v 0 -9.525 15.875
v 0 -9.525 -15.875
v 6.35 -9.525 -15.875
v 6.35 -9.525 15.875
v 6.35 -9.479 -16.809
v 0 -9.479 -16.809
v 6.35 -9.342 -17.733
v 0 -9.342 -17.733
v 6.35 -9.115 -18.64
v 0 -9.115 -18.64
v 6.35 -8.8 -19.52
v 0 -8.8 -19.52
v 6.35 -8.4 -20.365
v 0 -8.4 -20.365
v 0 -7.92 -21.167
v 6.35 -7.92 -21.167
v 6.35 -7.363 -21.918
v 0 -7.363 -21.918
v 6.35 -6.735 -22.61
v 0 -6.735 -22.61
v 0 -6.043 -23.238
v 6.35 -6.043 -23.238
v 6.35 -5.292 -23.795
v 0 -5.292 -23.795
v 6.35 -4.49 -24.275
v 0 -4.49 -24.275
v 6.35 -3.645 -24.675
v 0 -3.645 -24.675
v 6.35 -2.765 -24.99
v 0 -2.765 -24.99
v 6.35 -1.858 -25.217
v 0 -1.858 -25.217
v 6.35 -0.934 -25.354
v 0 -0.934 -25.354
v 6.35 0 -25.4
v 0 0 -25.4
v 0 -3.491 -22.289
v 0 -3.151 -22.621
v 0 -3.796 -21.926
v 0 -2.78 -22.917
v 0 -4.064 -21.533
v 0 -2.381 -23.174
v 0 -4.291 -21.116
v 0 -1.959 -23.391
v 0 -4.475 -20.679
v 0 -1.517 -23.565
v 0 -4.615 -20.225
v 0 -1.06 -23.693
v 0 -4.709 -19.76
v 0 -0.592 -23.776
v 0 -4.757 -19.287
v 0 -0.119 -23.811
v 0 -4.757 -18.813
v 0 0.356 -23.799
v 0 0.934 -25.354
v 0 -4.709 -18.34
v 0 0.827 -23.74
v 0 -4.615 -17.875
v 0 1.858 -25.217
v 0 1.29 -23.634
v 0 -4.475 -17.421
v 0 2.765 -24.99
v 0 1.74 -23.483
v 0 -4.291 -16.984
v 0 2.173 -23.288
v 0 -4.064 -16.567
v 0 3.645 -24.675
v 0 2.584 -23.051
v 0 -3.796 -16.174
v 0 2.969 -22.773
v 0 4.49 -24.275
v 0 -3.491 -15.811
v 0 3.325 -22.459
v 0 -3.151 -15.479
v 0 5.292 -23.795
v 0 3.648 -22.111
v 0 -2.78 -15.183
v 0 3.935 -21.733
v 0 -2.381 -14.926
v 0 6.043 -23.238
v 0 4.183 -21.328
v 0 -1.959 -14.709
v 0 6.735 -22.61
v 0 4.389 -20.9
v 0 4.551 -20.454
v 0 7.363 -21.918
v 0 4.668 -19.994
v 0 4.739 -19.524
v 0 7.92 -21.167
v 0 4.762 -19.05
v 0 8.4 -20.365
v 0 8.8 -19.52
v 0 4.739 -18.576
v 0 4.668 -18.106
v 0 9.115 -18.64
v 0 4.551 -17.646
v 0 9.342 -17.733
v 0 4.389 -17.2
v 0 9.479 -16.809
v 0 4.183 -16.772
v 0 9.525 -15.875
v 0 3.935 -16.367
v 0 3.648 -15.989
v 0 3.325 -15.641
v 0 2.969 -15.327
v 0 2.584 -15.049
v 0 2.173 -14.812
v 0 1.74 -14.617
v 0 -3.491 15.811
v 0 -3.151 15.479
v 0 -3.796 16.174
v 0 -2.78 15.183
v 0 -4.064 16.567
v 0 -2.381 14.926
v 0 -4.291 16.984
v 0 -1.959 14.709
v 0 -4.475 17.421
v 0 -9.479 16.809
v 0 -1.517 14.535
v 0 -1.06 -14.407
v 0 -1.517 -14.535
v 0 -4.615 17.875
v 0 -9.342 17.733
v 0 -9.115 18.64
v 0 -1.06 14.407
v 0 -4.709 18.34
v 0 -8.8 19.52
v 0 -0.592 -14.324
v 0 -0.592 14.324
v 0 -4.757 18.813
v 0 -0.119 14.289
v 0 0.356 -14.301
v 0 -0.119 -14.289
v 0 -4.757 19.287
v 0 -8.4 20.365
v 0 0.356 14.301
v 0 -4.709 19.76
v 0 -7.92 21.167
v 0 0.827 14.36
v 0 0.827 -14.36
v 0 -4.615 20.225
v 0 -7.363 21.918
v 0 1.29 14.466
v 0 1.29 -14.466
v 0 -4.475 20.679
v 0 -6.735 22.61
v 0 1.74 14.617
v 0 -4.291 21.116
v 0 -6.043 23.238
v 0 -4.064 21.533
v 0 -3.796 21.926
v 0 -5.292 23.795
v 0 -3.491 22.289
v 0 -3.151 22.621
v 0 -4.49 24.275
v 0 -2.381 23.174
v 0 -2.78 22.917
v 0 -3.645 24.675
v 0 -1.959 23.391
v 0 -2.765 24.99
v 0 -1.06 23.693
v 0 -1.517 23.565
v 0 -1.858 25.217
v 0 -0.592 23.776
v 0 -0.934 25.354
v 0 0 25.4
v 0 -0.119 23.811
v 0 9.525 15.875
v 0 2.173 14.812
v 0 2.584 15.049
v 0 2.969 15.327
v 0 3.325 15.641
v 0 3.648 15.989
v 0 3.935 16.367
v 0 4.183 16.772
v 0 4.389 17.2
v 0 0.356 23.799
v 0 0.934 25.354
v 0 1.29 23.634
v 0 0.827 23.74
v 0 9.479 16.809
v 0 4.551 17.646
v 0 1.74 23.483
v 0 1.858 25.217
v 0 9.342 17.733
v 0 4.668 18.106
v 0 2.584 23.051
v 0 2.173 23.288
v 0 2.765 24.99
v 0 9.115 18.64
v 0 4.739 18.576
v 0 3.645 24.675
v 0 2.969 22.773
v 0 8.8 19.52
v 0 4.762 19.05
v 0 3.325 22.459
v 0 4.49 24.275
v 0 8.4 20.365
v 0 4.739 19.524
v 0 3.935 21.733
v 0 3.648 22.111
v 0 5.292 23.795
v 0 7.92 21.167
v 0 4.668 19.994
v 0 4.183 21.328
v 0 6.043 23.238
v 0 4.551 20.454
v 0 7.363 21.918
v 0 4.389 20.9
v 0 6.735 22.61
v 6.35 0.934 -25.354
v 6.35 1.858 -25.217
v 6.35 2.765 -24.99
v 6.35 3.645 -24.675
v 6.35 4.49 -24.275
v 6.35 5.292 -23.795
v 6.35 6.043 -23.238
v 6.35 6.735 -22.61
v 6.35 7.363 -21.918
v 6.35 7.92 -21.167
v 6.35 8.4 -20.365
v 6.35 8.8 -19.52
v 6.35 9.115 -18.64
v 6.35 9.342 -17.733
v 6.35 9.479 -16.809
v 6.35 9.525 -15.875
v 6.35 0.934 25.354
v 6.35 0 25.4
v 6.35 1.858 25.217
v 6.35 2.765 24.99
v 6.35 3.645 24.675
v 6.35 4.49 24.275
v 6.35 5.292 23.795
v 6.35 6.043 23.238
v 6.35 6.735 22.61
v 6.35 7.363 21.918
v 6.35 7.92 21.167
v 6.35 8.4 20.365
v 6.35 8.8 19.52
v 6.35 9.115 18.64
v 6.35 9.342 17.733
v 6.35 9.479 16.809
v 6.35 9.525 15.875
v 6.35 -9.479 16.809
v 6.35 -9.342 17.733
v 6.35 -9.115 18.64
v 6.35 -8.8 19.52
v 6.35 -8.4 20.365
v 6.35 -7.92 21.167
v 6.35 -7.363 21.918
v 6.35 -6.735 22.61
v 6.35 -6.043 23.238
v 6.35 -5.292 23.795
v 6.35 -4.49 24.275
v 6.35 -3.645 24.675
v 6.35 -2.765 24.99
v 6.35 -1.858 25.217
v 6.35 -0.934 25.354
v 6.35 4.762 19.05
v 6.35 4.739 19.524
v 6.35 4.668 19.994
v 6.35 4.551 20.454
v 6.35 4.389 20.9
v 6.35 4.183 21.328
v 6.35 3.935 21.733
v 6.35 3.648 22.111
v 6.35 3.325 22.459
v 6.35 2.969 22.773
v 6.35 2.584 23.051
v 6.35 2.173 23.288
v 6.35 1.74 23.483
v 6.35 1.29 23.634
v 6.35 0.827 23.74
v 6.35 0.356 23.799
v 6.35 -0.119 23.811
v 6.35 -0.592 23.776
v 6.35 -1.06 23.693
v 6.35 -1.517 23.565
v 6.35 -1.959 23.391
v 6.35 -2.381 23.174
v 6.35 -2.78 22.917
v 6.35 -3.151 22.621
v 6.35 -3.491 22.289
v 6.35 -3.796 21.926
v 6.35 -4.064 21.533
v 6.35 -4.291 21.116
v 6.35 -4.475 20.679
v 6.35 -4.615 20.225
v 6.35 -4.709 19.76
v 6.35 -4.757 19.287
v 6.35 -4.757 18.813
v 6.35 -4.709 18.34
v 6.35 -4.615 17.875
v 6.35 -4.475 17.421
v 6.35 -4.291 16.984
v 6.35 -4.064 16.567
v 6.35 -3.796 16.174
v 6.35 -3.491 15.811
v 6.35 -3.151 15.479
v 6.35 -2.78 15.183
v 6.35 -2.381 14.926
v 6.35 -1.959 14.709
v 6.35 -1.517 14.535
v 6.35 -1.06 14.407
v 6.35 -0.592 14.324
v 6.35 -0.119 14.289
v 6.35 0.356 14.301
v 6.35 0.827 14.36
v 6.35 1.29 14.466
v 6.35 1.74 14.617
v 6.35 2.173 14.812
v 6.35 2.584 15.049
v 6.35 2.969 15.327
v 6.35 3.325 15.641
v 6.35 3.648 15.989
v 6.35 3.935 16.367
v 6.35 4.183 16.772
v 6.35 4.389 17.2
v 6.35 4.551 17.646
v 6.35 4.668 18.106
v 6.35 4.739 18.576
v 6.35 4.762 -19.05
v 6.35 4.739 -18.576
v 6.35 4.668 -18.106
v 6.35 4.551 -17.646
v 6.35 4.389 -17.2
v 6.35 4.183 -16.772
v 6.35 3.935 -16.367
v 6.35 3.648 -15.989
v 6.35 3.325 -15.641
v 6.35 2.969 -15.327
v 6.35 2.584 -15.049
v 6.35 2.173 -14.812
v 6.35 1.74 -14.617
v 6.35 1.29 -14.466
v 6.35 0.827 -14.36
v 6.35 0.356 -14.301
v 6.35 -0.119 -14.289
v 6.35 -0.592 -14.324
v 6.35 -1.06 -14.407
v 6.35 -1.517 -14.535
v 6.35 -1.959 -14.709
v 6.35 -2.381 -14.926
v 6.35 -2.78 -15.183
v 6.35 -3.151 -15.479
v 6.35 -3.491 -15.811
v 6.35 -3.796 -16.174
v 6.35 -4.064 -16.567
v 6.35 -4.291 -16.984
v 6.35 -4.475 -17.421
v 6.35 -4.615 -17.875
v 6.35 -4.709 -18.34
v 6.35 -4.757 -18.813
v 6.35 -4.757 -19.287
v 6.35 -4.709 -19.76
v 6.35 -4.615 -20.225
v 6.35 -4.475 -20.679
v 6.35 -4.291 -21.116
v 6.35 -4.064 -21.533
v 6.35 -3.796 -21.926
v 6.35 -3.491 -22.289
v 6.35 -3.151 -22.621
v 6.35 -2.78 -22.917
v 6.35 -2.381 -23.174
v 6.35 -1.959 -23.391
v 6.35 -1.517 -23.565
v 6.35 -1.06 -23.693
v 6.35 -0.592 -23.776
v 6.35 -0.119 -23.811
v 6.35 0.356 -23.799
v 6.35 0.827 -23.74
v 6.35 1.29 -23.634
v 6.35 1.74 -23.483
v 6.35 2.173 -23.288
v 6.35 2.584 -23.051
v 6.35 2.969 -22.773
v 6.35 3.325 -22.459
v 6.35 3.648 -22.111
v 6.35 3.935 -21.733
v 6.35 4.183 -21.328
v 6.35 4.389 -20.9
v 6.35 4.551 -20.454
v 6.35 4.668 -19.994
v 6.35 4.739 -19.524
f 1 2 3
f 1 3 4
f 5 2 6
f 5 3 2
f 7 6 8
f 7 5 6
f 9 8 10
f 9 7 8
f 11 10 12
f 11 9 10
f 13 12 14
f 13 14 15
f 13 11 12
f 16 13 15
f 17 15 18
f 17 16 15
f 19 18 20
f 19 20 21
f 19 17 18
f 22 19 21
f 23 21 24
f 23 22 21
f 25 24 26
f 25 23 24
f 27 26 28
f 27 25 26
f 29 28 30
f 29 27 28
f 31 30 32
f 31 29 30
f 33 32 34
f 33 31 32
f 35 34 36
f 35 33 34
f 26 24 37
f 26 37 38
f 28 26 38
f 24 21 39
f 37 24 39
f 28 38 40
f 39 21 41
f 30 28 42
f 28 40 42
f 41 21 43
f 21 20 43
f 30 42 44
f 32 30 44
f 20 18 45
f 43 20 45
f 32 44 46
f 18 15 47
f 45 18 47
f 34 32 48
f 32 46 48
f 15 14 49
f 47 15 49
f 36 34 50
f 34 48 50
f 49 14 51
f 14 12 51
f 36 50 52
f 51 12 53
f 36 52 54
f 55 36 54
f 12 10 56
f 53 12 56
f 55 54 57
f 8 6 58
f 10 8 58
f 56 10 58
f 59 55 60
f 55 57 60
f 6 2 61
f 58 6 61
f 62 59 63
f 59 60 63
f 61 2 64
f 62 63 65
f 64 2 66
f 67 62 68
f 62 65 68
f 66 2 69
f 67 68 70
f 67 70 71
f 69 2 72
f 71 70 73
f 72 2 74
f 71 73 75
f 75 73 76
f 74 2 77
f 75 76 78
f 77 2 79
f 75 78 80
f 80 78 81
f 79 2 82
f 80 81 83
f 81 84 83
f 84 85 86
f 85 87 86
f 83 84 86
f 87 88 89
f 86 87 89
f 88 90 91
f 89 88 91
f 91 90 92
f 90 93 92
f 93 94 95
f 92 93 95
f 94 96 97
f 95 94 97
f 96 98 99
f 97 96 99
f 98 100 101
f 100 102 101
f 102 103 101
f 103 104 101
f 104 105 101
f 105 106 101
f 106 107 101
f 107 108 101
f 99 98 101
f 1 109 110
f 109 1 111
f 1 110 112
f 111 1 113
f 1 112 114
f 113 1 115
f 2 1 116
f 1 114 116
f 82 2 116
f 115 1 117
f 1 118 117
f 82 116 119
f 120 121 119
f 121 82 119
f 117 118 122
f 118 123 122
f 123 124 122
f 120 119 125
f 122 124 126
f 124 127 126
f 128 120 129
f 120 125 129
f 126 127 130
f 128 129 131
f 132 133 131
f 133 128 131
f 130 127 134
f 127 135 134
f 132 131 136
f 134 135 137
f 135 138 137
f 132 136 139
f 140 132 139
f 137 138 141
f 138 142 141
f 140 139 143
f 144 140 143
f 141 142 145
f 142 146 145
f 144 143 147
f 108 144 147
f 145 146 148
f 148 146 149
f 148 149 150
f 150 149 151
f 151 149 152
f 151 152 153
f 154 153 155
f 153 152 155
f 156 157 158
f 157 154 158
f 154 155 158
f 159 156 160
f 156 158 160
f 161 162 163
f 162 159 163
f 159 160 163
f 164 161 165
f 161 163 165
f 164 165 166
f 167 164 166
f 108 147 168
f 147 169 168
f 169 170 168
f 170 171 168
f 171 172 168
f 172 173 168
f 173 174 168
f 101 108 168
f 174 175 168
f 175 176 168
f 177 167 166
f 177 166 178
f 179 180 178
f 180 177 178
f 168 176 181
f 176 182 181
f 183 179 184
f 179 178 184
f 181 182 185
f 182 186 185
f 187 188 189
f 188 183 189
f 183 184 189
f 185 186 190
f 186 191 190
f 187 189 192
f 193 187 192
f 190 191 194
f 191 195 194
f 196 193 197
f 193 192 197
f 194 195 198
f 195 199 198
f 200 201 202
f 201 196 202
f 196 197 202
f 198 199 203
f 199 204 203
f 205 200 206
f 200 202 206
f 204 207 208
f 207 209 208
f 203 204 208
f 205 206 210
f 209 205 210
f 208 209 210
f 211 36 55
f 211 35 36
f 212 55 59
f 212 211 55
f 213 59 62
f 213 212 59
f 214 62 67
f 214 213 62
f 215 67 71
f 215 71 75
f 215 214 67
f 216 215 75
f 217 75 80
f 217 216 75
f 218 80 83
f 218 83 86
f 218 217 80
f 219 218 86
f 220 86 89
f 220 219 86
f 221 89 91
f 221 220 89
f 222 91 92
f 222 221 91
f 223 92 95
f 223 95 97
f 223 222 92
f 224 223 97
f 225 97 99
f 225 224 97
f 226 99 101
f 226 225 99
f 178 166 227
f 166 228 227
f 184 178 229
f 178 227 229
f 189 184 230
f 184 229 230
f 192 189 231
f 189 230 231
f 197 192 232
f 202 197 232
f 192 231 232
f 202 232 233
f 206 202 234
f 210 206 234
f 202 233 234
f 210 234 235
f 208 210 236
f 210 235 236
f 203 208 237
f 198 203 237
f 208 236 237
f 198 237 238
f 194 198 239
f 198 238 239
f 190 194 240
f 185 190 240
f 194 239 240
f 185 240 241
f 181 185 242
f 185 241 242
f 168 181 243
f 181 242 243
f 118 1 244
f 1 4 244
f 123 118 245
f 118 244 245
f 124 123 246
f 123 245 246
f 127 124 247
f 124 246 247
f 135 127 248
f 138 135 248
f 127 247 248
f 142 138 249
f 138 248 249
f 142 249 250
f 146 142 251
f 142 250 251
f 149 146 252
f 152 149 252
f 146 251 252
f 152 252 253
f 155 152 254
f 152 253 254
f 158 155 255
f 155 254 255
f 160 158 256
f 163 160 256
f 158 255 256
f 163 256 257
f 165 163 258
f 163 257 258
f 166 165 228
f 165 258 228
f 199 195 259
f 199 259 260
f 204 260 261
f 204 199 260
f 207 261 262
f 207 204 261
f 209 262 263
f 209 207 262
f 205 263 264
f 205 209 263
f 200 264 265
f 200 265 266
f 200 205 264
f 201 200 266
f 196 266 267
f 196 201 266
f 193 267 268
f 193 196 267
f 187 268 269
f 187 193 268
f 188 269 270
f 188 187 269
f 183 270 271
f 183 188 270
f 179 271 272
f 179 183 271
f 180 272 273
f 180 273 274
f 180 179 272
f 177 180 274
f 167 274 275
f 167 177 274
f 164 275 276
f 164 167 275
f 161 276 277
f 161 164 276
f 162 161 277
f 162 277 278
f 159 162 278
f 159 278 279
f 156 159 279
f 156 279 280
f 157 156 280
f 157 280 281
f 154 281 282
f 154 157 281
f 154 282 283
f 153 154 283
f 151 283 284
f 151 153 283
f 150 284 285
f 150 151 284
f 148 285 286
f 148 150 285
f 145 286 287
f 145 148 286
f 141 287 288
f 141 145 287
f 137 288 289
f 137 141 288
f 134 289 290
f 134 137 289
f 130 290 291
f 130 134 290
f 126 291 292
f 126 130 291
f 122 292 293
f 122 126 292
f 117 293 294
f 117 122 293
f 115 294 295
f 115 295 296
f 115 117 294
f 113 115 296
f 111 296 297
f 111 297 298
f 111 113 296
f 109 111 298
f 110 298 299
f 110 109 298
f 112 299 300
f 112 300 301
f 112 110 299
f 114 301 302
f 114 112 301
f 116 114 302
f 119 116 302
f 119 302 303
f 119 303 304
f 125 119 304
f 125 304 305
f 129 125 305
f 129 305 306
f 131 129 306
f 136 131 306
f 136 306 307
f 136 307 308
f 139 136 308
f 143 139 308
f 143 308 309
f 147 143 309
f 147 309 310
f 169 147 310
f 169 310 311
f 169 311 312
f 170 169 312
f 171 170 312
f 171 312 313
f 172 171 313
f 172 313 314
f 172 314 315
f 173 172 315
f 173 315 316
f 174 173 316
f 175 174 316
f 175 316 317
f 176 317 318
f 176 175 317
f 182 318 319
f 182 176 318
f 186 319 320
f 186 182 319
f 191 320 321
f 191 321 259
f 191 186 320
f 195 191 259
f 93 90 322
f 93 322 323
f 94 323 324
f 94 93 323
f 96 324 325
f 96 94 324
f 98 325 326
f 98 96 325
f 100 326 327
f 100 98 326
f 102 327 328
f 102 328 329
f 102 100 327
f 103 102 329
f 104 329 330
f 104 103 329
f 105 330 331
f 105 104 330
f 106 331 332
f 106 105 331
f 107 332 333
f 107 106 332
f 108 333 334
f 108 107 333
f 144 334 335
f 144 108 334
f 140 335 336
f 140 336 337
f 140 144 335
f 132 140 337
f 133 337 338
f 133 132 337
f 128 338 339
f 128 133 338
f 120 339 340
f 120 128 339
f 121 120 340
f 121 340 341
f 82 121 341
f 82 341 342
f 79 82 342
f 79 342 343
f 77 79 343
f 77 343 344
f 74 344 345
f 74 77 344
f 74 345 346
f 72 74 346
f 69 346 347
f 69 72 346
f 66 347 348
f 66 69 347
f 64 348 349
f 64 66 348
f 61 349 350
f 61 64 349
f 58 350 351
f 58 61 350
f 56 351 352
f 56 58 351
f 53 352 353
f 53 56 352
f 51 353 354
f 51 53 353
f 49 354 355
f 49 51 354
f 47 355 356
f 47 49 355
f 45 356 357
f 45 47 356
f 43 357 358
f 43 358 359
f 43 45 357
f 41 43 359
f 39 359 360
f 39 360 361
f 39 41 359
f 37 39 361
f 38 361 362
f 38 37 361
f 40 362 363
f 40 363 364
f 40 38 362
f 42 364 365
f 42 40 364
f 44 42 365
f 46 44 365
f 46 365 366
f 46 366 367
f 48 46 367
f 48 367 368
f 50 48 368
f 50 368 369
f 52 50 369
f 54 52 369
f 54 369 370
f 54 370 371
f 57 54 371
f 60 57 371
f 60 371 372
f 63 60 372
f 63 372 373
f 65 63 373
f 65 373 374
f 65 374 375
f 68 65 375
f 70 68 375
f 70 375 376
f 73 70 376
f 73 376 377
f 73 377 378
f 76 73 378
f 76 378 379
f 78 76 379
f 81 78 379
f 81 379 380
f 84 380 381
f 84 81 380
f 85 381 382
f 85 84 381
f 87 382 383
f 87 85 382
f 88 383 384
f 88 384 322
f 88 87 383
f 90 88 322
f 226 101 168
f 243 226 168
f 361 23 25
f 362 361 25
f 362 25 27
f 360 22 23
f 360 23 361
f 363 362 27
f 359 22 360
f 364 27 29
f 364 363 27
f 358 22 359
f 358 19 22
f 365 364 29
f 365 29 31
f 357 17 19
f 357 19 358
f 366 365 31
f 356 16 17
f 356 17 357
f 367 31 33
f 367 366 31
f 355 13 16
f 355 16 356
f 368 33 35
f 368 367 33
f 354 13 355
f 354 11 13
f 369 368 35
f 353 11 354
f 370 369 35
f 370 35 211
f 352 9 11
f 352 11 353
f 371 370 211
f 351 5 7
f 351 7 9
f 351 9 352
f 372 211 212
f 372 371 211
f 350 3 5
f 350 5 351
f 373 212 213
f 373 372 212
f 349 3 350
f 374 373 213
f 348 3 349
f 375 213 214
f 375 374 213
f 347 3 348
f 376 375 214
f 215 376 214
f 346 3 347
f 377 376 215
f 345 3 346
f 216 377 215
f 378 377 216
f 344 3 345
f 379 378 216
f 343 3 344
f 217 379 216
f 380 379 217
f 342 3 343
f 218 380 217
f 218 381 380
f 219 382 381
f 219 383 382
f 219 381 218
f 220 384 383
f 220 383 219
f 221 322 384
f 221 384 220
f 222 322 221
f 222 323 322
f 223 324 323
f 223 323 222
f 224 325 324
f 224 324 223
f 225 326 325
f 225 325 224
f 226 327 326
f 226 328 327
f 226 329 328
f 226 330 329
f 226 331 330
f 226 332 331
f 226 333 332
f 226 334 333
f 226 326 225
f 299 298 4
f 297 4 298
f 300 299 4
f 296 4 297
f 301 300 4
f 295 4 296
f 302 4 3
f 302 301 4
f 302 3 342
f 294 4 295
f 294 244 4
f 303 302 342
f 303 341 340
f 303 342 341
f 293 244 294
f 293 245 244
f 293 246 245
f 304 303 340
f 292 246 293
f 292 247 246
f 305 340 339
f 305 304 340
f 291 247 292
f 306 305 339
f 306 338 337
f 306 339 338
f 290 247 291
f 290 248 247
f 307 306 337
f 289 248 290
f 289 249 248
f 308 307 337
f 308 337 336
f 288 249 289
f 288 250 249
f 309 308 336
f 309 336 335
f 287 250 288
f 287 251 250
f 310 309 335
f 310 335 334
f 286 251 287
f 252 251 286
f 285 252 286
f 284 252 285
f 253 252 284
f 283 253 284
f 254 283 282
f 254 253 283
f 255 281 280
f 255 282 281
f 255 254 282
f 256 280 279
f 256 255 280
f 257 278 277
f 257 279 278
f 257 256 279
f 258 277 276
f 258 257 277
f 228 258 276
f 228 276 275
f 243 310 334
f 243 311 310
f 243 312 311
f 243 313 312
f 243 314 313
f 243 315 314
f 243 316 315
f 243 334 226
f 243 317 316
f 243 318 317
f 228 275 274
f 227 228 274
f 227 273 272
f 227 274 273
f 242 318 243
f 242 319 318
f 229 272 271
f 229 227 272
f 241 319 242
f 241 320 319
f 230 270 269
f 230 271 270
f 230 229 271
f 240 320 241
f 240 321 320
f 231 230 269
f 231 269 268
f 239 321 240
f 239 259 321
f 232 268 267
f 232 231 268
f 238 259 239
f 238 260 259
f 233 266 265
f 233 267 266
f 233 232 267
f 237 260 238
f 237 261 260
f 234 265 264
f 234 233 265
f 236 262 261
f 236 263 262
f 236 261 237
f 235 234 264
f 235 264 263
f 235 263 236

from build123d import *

# Parameters (mm, degrees)
F0_W     = 19.05
F0_H     = 50.8
F0_R     = 4.7625
F1_DEPTH = 6.35
F2_R     = 9.52499


# Not quite as in the source:
# - a fillet or chamfer is up to 0.001 mm smaller than in the source, because OpenCascade refuses the exact size


with BuildPart() as f1:
    # F0 (on Right) → F1 (new body)
    with BuildSketch(Plane.YZ):
        Rectangle(F0_W, F0_H)
        with Locations((0, -19.05)):
            Circle(F0_R, mode=Mode.SUBTRACT)
        with Locations((0, 19.05)):
            Circle(F0_R, mode=Mode.SUBTRACT)
    extrude(amount=F1_DEPTH)

    # F2 (radius 9.525 in the source; OpenCascade refuses exactly that, so slightly less here)
    f2_edges = [f1.edges().sort_by_distance(p)[0] for p in [
        (3.175, 9.525, 25.4),
        (3.175, -9.525, 25.4),
        (3.175, 9.525, -25.4),
        (3.175, -9.525, -25.4),
    ]]
    fillet(f2_edges, radius=F2_R)


solid = f1.part
